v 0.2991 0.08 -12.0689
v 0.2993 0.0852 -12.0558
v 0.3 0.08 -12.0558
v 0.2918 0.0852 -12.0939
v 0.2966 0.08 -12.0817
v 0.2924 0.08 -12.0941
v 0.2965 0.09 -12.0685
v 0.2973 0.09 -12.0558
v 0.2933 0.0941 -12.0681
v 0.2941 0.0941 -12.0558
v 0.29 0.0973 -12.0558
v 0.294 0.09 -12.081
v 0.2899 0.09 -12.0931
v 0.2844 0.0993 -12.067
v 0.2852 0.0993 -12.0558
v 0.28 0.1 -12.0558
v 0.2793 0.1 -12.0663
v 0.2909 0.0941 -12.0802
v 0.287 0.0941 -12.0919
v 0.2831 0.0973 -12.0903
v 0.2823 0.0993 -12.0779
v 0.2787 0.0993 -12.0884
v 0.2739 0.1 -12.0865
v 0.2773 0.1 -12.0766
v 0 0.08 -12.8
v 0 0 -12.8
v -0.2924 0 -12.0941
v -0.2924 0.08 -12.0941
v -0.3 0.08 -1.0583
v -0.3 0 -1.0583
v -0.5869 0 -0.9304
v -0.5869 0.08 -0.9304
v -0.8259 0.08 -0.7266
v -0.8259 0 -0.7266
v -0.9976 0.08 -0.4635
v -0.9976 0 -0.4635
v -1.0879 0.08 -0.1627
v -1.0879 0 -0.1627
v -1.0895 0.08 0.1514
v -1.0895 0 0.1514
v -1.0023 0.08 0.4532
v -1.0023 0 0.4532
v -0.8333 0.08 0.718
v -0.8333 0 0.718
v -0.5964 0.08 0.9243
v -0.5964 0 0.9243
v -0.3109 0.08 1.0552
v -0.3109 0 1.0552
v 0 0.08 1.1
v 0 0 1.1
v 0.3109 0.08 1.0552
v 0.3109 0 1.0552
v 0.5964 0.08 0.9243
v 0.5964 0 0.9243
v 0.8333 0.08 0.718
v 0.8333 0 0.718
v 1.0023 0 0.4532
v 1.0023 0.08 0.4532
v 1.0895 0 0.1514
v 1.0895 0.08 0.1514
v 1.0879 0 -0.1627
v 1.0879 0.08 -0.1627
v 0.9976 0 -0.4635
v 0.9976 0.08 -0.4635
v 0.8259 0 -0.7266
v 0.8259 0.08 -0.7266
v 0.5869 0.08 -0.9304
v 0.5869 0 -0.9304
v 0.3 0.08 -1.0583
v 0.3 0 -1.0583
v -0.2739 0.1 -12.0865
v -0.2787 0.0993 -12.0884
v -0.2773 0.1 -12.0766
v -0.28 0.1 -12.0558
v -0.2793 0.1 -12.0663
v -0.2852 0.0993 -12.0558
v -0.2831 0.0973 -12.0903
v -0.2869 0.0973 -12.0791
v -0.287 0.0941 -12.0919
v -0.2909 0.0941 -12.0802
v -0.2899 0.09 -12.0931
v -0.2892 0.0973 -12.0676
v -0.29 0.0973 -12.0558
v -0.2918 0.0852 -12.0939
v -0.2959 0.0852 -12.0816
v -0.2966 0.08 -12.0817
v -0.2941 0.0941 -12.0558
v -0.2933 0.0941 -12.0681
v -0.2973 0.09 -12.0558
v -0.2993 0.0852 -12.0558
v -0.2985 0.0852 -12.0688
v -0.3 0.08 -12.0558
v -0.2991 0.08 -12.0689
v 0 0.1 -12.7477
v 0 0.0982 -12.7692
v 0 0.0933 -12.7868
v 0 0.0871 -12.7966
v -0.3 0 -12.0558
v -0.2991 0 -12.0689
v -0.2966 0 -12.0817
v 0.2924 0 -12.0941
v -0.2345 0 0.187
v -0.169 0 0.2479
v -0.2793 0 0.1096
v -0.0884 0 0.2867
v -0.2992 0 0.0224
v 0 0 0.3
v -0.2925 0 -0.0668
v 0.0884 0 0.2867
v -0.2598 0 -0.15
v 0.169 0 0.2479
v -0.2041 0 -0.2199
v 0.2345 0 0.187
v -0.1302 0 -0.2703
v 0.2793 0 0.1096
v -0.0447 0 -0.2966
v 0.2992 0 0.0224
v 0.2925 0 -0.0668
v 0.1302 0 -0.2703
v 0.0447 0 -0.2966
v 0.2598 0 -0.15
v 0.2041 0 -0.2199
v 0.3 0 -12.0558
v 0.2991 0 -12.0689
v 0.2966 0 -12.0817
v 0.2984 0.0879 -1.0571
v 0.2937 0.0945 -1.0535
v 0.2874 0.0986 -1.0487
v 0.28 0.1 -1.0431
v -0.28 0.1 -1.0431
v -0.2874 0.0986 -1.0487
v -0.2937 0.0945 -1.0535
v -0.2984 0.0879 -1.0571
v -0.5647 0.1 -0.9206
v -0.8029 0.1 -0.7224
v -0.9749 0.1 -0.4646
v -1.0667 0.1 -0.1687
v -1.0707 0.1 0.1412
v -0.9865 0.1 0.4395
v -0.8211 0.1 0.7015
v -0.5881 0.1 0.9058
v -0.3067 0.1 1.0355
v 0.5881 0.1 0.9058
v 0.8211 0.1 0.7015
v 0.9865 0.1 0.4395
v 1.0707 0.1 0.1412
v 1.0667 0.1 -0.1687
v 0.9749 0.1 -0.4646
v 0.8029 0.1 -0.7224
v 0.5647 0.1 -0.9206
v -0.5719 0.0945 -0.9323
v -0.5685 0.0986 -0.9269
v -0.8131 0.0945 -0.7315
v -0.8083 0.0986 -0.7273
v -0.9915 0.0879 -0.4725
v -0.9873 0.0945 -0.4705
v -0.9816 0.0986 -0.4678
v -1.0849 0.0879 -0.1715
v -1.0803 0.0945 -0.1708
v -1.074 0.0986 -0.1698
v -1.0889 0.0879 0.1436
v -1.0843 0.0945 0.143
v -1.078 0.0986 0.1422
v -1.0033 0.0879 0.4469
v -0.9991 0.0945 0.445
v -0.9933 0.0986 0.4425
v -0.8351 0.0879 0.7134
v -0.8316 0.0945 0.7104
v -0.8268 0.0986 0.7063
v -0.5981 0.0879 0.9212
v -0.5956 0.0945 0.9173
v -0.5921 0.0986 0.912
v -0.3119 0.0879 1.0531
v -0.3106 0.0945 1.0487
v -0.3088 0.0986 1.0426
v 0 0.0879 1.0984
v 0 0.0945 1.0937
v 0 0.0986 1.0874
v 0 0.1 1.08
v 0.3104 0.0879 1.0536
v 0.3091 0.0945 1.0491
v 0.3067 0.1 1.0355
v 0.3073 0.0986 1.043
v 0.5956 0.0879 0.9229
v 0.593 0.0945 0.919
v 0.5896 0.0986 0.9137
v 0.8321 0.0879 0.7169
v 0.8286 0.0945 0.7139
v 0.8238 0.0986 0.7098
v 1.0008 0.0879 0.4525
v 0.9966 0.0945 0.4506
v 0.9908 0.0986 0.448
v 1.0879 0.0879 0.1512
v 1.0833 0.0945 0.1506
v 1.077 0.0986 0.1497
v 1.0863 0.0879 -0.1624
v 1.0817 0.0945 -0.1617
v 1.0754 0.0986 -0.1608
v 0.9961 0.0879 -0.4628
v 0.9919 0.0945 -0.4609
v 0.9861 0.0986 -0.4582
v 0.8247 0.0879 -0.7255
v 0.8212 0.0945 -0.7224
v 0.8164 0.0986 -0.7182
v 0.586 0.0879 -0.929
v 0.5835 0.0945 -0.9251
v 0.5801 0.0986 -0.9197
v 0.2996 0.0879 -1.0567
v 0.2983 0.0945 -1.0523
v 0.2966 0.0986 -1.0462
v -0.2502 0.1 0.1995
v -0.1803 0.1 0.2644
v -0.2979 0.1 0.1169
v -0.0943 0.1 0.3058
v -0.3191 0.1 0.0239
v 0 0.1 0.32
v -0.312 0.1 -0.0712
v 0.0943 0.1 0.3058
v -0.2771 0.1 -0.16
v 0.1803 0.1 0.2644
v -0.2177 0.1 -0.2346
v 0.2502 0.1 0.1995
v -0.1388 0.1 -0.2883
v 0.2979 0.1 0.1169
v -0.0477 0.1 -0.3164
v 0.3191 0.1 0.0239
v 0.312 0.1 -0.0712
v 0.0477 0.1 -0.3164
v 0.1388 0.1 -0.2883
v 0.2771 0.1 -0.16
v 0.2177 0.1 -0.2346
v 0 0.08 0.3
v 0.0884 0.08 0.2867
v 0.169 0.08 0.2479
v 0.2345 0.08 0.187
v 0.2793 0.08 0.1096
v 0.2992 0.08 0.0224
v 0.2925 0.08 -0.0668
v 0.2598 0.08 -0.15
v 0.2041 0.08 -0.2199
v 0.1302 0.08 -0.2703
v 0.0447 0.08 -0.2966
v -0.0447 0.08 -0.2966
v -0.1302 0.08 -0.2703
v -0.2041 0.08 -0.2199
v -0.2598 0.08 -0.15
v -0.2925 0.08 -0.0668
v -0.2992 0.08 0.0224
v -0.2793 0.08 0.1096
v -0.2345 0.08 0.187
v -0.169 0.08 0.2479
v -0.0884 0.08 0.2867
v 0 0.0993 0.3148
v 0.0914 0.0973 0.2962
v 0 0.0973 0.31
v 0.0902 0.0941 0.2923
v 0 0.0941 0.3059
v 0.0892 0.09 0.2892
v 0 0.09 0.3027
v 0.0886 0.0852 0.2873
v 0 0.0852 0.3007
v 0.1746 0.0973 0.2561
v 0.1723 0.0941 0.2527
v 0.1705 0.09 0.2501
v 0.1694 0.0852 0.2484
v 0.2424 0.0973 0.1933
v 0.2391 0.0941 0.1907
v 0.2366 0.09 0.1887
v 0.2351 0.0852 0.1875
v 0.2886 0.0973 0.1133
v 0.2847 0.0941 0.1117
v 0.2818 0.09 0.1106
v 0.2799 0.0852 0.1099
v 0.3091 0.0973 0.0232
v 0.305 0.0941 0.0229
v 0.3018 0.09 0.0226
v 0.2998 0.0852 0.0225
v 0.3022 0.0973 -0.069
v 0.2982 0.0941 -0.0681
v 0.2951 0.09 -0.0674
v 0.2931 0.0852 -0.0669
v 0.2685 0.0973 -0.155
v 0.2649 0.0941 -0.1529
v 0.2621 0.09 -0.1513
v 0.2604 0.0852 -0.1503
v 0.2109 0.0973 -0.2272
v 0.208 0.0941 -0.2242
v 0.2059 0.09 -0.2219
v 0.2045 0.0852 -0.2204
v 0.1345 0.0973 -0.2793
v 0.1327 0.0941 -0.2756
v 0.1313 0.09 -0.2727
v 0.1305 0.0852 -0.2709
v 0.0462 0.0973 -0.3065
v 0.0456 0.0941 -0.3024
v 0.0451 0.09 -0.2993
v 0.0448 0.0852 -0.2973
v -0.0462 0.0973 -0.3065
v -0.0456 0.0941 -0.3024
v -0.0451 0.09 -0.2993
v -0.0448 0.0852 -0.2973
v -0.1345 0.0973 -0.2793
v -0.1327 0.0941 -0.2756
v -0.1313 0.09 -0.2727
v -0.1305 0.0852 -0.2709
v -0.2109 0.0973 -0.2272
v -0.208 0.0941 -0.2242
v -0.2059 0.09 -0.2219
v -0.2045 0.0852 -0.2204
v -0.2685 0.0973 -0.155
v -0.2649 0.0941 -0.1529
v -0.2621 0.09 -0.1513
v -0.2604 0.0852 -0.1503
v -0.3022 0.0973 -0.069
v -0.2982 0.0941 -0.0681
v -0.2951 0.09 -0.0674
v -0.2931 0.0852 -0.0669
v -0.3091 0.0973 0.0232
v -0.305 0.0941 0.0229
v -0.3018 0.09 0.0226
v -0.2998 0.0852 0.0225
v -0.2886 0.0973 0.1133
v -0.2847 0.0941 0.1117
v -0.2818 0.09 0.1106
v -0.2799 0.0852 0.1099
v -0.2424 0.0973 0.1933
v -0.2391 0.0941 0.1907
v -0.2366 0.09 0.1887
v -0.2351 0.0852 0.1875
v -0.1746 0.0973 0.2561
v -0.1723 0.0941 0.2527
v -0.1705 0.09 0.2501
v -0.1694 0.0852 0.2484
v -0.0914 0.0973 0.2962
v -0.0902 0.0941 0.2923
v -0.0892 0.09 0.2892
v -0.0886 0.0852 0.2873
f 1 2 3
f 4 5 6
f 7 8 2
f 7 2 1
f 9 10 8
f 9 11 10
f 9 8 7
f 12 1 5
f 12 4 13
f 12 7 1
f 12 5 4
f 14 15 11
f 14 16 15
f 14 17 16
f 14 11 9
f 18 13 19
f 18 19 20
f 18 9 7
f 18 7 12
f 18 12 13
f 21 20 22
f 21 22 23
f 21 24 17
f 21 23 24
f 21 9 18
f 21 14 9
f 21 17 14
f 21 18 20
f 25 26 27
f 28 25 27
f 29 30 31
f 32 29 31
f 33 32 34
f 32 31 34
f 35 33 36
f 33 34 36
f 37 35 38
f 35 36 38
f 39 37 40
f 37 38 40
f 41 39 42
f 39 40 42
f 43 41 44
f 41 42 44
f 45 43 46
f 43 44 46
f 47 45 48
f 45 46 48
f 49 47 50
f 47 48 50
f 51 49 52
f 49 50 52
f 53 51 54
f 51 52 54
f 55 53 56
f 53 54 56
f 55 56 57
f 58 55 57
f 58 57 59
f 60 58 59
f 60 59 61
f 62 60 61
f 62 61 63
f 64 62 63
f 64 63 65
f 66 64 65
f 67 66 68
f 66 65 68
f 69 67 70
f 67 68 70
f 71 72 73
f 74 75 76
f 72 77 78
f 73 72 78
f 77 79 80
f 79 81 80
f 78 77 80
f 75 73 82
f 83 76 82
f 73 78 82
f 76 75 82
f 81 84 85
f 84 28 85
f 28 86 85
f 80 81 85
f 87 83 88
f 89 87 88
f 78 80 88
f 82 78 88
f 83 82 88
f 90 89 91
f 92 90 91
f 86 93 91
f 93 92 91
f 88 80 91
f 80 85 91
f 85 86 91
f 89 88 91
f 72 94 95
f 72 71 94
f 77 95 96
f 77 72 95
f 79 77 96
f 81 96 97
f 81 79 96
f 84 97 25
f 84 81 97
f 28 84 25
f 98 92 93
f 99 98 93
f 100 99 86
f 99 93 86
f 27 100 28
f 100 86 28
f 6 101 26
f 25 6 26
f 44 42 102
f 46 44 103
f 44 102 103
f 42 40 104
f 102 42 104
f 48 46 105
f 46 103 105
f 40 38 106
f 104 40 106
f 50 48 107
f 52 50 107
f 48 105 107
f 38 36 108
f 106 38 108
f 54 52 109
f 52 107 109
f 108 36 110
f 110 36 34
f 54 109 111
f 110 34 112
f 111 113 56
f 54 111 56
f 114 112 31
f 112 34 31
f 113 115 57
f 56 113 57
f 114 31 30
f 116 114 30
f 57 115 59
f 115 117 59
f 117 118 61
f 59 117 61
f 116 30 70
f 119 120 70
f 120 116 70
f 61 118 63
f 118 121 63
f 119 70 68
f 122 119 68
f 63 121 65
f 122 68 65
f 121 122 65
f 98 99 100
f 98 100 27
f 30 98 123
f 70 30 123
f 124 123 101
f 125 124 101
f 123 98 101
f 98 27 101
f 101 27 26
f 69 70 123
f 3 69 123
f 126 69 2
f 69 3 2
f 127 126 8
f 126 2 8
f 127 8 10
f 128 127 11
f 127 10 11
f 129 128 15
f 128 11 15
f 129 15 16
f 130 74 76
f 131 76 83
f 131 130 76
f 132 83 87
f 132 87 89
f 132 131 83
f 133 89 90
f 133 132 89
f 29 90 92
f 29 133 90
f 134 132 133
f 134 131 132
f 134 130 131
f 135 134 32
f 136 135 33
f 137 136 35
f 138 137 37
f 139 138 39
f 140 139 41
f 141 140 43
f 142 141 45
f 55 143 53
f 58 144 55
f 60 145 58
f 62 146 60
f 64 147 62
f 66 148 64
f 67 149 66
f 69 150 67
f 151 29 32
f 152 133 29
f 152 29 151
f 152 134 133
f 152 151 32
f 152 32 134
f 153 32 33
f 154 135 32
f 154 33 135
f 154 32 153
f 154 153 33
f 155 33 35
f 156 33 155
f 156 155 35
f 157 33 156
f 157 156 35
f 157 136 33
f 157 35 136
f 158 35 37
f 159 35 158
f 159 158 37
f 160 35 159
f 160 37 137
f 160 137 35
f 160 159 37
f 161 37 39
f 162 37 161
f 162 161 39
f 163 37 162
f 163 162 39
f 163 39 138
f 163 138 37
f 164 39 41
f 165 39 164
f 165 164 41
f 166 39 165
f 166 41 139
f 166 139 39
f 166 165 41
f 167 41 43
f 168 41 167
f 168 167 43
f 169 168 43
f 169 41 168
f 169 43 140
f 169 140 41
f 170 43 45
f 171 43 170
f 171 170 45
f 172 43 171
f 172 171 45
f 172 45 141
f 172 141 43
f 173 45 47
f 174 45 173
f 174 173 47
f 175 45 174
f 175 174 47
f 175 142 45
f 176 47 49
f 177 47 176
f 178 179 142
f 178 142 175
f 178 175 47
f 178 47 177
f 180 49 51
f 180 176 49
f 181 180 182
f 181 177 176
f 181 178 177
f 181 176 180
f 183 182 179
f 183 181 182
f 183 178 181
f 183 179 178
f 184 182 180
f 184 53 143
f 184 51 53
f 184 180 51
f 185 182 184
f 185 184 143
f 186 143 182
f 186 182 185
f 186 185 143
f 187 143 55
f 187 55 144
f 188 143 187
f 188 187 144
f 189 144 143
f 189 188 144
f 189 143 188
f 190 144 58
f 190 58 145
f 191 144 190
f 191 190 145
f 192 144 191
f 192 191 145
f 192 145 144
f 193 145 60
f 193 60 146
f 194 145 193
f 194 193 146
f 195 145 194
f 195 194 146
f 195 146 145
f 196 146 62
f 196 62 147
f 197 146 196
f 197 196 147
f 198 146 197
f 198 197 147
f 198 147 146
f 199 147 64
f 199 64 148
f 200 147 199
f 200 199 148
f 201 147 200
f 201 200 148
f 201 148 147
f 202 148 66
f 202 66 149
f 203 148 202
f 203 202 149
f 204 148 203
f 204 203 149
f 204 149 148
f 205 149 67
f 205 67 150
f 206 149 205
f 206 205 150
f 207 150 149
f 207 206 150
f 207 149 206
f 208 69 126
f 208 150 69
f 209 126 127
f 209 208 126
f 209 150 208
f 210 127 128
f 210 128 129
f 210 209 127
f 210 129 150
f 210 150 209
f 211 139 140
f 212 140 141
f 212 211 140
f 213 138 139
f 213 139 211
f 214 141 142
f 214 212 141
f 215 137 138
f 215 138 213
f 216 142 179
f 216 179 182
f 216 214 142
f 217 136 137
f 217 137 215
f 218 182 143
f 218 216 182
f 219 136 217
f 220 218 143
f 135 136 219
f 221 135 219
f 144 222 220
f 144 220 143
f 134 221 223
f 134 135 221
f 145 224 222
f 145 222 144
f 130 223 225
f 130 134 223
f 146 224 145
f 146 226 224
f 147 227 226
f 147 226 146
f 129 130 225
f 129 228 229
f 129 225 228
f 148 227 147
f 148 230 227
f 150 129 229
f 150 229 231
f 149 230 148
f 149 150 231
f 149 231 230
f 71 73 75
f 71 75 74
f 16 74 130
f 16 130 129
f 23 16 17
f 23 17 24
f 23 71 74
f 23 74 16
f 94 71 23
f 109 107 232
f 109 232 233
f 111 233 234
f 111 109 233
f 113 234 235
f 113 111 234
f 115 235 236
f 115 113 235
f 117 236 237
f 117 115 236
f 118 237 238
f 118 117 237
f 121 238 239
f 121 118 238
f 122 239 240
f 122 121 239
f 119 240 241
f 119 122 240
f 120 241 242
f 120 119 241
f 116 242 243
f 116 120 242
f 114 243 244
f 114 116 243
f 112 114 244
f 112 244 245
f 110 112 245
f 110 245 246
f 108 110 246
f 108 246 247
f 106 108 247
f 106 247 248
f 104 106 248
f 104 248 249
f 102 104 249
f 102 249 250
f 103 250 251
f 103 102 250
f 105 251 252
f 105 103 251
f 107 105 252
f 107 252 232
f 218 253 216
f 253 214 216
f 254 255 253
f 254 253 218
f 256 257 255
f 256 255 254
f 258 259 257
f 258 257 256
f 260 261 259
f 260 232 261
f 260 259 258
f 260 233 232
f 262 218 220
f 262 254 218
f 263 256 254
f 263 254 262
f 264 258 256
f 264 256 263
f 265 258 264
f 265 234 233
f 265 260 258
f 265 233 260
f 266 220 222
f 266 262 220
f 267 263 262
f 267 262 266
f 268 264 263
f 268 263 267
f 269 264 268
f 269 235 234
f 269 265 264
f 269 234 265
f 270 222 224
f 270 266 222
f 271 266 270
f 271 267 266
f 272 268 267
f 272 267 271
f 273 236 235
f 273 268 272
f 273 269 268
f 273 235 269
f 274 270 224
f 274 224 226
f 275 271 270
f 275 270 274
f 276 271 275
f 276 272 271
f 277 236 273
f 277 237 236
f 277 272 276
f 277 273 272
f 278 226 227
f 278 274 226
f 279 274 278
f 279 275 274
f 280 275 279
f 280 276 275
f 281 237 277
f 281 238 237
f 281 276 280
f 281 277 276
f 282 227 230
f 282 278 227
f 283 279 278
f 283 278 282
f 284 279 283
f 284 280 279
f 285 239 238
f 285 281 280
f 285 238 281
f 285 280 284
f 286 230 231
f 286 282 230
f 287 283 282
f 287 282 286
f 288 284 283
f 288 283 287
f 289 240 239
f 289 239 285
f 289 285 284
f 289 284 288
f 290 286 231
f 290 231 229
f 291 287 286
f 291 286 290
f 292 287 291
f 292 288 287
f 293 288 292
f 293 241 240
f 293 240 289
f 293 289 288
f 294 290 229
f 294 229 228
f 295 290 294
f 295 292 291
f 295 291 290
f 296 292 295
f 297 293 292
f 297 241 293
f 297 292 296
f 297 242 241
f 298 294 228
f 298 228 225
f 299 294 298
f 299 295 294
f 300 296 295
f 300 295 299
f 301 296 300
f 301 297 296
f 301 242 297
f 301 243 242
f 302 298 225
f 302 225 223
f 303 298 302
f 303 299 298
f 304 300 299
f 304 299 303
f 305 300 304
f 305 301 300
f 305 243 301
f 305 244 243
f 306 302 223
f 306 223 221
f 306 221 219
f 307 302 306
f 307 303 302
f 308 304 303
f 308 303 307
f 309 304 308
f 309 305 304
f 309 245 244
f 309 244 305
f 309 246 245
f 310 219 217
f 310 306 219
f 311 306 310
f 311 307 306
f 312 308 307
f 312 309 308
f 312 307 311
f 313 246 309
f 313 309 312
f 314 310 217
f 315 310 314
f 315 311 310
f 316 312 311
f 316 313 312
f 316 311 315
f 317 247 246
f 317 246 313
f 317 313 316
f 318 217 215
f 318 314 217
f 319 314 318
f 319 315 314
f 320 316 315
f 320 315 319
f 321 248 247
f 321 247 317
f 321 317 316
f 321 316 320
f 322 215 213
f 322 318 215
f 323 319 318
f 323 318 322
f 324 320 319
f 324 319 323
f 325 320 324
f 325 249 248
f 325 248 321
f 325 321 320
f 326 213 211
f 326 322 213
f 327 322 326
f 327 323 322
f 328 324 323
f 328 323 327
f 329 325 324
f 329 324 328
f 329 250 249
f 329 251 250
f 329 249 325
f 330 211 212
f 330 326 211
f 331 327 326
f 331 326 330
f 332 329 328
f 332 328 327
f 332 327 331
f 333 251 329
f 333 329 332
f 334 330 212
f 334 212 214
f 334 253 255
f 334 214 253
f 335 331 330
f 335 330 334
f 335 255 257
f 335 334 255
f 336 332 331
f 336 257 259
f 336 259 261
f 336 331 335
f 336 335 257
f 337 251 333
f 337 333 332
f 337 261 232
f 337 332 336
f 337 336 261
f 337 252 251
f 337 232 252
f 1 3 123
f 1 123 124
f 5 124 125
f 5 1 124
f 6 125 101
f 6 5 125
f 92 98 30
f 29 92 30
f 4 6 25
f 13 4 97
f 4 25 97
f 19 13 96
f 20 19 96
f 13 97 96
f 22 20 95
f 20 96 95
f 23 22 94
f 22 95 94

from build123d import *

# Parameters (mm, degrees)
SKETCH_1_R      = 0.3
EXTRUDE_1_DEPTH = 0.1
FILLET_1_R      = 0.1
FILLET_2_R      = 0.02


with BuildPart() as part:
    # 草图1 → 凸台-拉伸1 (new body)
    with BuildSketch(Plane(origin=(0, 0, 0), x_dir=(1, 0, 0), z_dir=(0, 1, 0))):
        with BuildLine():
            Line((0.3, 1.058300524), (0.3, 12.075735931))
            Line((0.3, 12.075735931), (0, 12.8))
            Line((0, 12.8), (-0.3, 12.075735931))
            Line((-0.3, 12.075735931), (-0.3, 1.058300524))
            ThreePointArc((-0.3, 1.058300524), (0, -1.1), (0.3, 1.058300524))
        make_face()
        with Locations(Location((0, 0, 0), (0, 0, 270))):
            Circle(SKETCH_1_R, mode=Mode.SUBTRACT)
    extrude(amount=EXTRUDE_1_DEPTH)

    # 圆角1
    fillet_1_edges = [part.edges().sort_by_distance(p)[0] for p in [
        (0.3, 0.05, -12.075735931),
        (-0.3, 0.05, -12.075735931),
    ]]
    fillet(fillet_1_edges, radius=FILLET_1_R)

    # 圆角2
    fillet_2_edges = [part.edges().sort_by_distance(p)[0] for p in [
        (0.3, 0.1, -6.557072609),
        (0.298078528, 0.1, -12.075353727),
        (0, 0.1, 1.1),
        (0.146193977, 0.1, -12.447056519),
        (-0.3, 0.1, -6.557072609),
        (-0.146193977, 0.1, -12.447056519),
        (-0.298078528, 0.1, -12.075353727),
        (0, 0.1, -0.3),
    ]]
    fillet(fillet_2_edges, radius=FILLET_2_R)


solid = part.part
